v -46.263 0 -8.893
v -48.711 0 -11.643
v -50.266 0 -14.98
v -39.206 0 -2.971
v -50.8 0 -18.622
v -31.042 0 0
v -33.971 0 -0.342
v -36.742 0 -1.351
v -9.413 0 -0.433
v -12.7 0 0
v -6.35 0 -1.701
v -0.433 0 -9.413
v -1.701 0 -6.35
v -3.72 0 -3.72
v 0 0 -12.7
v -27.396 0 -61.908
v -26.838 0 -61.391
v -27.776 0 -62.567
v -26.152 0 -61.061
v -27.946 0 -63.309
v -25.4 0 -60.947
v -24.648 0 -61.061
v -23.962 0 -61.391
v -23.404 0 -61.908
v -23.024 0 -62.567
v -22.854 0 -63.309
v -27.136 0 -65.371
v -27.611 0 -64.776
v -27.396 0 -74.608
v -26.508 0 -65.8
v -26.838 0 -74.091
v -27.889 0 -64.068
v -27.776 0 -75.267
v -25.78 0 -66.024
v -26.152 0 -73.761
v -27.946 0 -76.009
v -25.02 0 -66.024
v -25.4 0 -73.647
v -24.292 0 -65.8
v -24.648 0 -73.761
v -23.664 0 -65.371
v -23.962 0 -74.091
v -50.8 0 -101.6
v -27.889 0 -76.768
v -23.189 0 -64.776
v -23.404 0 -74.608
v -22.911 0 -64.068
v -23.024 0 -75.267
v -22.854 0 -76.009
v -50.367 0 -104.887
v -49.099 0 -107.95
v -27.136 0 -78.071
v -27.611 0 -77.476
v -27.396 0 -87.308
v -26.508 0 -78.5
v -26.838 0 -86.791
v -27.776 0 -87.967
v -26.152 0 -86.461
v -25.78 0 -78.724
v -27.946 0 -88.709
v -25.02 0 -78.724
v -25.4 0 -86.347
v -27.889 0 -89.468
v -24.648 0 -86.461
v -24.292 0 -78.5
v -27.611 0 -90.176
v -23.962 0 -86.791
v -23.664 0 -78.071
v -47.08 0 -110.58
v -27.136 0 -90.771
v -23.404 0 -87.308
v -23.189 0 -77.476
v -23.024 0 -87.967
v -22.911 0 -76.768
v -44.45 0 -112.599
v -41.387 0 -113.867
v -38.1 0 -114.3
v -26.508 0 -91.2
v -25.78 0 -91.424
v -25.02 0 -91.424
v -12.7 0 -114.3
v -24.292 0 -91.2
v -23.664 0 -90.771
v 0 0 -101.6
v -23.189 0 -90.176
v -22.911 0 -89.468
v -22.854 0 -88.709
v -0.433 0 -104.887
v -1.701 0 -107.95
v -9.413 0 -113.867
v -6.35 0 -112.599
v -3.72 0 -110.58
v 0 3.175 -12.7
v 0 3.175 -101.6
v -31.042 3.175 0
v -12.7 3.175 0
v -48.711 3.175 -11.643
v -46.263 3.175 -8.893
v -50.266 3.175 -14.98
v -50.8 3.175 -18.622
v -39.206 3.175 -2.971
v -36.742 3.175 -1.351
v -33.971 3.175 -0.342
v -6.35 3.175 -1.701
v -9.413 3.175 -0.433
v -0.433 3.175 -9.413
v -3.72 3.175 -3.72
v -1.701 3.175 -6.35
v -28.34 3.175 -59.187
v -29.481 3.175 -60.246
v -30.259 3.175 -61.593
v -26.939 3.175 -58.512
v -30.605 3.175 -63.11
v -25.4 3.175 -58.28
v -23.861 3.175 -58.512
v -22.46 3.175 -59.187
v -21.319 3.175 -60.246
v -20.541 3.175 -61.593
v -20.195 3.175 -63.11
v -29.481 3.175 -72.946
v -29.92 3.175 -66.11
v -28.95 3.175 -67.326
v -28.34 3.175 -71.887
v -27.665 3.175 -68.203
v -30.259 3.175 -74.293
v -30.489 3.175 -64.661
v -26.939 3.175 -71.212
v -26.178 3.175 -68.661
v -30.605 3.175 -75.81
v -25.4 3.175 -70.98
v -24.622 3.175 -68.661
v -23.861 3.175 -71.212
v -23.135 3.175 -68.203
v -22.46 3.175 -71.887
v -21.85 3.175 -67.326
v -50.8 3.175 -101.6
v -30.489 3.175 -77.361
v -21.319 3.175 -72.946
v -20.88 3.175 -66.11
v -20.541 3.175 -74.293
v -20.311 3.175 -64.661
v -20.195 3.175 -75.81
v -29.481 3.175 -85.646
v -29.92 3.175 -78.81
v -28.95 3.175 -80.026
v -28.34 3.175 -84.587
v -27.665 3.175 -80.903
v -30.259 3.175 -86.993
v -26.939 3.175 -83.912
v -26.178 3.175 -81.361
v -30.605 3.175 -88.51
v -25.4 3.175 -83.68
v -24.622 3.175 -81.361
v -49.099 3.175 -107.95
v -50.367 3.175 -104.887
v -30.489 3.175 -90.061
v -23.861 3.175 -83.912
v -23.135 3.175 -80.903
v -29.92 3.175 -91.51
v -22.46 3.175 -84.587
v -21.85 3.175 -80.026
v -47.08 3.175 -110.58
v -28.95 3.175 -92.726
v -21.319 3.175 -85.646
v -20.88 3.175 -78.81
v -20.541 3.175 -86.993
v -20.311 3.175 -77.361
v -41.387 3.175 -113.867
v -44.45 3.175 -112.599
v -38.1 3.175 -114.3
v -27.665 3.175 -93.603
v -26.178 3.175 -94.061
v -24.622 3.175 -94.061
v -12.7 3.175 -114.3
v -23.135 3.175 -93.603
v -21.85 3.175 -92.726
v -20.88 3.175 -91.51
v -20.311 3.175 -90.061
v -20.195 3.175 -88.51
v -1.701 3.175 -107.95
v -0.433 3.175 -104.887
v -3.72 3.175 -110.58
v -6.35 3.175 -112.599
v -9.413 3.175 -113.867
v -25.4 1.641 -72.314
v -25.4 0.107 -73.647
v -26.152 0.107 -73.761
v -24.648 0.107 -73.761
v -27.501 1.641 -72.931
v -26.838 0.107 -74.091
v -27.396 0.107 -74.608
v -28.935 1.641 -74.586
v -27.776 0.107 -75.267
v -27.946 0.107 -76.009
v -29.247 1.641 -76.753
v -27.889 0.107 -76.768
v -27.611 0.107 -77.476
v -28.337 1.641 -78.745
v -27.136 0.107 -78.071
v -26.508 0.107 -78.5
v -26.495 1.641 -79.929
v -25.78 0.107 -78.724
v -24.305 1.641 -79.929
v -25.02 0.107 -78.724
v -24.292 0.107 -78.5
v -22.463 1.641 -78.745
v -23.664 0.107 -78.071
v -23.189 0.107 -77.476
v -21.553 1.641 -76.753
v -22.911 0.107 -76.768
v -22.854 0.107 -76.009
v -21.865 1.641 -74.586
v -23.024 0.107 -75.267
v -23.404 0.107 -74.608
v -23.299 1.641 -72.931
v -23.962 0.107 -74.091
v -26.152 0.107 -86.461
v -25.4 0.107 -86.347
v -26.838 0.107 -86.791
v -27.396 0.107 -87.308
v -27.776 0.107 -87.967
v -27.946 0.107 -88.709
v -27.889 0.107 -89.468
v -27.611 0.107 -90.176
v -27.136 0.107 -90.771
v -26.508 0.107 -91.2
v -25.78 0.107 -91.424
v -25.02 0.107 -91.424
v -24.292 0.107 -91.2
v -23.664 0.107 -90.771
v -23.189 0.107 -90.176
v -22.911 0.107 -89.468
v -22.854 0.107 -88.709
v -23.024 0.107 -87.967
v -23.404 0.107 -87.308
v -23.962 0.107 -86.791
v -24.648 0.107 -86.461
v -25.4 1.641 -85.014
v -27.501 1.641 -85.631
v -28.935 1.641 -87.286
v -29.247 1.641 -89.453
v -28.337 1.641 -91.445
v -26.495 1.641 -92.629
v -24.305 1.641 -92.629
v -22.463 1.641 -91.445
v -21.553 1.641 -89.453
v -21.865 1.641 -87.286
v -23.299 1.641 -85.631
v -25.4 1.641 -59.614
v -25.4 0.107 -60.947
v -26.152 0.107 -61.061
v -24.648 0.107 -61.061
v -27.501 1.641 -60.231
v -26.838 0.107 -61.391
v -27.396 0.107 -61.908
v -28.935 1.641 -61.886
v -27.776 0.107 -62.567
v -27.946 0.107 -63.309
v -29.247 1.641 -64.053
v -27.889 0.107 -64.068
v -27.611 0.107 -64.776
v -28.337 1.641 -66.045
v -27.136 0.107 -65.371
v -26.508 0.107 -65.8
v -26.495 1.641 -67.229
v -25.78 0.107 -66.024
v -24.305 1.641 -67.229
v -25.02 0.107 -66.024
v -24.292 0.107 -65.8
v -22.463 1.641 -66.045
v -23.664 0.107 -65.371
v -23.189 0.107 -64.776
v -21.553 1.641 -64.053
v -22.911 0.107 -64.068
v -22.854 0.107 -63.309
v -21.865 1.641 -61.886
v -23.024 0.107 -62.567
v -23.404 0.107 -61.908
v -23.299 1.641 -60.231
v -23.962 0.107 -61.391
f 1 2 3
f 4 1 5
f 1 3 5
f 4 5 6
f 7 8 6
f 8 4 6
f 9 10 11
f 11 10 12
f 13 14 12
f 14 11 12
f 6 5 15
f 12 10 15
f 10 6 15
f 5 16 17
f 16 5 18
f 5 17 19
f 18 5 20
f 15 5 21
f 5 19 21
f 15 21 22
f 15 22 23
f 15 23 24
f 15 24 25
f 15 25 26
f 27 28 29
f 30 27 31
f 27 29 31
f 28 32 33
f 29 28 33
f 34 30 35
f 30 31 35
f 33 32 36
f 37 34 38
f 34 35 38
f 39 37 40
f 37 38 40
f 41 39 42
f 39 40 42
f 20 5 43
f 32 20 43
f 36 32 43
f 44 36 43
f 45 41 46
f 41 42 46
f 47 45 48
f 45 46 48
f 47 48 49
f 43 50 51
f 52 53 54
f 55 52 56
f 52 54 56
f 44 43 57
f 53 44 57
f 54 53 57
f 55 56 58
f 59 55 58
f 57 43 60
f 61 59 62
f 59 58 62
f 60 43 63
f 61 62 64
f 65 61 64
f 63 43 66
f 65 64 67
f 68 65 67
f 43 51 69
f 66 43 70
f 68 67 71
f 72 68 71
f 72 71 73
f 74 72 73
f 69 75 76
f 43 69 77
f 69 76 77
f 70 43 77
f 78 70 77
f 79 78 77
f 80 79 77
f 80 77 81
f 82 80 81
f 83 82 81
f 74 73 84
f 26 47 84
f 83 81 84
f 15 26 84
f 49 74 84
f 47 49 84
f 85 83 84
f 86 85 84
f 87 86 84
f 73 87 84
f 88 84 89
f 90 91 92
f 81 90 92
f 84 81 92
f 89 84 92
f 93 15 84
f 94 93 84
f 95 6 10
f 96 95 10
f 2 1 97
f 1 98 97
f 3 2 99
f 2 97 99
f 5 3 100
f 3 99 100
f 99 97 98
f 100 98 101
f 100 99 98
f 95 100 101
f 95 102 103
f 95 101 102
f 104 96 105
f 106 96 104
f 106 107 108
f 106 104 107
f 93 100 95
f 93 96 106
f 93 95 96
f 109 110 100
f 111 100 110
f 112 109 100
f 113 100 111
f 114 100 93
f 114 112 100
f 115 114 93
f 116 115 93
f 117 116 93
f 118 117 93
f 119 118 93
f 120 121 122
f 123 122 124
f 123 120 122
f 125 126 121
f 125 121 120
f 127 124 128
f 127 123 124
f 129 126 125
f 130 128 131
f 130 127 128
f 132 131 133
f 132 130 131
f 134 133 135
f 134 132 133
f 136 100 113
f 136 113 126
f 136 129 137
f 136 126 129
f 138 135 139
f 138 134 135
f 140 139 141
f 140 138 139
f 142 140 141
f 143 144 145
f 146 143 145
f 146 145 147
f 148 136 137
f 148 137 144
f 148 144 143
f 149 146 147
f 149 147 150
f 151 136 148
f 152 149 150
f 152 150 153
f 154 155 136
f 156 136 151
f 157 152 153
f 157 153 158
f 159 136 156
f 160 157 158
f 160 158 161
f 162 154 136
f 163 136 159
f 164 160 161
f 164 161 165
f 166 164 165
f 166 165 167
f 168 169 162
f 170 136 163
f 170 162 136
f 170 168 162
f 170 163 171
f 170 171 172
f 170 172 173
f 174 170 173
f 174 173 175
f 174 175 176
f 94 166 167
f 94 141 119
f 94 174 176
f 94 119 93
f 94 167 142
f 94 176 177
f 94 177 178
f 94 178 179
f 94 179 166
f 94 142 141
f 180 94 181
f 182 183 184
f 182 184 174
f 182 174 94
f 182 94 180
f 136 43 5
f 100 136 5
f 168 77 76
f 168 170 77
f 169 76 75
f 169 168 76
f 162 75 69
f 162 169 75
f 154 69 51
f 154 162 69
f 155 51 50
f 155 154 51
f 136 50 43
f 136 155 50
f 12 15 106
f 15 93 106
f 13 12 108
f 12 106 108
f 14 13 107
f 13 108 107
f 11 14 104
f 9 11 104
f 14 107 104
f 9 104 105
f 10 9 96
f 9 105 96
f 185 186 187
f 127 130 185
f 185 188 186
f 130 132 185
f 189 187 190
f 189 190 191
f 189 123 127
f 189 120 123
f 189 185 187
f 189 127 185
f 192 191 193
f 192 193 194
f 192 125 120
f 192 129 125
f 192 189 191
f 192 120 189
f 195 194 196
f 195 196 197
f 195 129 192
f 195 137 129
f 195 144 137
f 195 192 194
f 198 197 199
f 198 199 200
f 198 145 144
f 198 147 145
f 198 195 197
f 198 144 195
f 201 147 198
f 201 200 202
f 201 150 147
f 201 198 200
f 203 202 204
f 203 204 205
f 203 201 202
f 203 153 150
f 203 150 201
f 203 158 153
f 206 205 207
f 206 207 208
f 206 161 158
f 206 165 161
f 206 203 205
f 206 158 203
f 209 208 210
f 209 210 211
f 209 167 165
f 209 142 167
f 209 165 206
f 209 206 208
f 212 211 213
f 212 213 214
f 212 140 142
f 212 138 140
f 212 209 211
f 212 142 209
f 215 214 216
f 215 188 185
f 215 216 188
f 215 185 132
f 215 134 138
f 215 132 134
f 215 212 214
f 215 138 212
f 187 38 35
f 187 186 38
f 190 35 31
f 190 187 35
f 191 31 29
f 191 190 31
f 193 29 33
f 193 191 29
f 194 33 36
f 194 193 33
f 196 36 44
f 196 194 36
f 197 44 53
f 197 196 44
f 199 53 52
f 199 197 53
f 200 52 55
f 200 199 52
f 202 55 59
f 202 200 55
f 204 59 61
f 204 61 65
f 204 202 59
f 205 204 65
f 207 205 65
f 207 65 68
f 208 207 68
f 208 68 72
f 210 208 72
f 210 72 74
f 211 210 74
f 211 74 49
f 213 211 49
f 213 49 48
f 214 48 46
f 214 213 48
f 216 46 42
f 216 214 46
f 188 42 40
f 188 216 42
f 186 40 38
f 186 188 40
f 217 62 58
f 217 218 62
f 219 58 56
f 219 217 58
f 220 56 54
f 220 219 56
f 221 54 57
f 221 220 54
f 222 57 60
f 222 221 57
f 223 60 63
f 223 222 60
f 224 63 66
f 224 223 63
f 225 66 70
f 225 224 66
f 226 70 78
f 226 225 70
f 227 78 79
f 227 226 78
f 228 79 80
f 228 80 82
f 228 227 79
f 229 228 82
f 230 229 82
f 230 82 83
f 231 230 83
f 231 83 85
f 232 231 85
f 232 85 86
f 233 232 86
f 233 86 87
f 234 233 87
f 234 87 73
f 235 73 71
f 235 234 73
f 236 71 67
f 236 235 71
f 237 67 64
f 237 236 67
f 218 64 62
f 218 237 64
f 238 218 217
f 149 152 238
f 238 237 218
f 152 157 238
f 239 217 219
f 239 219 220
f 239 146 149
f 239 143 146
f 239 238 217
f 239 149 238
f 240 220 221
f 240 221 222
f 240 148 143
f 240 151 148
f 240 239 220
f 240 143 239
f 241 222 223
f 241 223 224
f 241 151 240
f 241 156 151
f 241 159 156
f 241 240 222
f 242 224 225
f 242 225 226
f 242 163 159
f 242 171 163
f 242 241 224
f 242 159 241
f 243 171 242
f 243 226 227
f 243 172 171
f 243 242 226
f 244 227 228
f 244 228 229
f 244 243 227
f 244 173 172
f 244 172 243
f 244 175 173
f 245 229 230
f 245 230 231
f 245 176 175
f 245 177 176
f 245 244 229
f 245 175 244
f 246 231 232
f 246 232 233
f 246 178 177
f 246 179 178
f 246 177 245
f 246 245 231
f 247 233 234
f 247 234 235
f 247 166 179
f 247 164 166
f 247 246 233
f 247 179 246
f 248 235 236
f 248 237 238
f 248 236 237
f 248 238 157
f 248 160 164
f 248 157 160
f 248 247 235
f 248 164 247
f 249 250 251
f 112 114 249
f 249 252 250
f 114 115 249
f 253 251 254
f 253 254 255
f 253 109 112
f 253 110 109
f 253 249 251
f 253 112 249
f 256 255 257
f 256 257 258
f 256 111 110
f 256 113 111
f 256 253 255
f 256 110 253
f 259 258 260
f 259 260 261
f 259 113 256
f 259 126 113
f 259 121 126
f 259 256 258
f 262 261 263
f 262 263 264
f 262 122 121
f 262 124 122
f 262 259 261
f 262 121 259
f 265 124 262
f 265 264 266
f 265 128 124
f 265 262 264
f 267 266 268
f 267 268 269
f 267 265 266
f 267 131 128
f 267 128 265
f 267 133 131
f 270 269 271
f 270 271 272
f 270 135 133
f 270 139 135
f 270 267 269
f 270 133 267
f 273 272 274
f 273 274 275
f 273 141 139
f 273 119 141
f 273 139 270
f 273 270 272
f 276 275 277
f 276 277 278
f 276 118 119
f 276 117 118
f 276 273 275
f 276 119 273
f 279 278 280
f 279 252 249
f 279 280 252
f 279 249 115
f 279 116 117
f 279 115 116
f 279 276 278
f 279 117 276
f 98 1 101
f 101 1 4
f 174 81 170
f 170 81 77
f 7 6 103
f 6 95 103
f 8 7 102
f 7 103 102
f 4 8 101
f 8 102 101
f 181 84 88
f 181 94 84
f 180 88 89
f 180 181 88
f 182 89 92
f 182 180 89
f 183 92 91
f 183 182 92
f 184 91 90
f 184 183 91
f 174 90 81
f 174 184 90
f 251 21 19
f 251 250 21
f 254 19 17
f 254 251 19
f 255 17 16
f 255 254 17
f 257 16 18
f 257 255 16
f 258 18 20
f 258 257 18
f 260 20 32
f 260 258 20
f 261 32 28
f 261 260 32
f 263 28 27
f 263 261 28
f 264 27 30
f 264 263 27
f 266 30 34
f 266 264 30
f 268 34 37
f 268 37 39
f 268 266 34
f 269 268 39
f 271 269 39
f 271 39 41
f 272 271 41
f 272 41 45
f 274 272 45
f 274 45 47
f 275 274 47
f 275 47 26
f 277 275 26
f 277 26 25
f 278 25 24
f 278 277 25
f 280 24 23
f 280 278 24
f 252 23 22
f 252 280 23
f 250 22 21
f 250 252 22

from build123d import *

# Parameters (mm, degrees)
BOSS_EXTRUDE1_DEPTH                         = 3.175
CSK_FOR_10_FLAT_HEAD_SOCKET_CAP_SCR_2_COUNT = 2
CSK_FOR_10_FLAT_HEAD_SOCKET_CAP_SCR_2_PITCH = 12.7
CSK_FOR_10_FLAT_HEAD_SOCKET_CAP_SCR_3_COUNT = 2
CSK_FOR_10_FLAT_HEAD_SOCKET_CAP_SCR_3_PITCH = 12.7
FILLET2_R                                   = 12.7


with BuildPart() as part:
    # Sketch1 → Boss-Extrude1 (new body)
    with BuildSketch(Plane(origin=(0, 0, 0), x_dir=(1, 0, 0), z_dir=(0, 1, 0))):
        Polygon((0, 0), (0, 114.3), (-50.8, 114.3), (-50.8, 12.7), (-35.664729374, 0), align=None)
    extrude(amount=BOSS_EXTRUDE1_DEPTH)

    # Sketch6 → CSK for #10 Flat Head Socket Cap Screw1 (revolve, cut)
    with BuildSketch(Plane(origin=(-25.4, 3.175, -76.2), x_dir=(0, 0, 1), z_dir=(1, 0, 0))):
        Polygon((0, 0), (0, 3.175), (2.5527, 3.175), (2.5527, 3.068032542), (5.2197, 0), align=None)
    csk_for_10_flat_head_socket_cap_screw1 = revolve(axis=Axis((-25.4, 9.525, -76.2), (0, -1, 0)), mode=Mode.SUBTRACT)

    # CSK for _10 Flat Head Socket Cap Scr 2: CSK for #10 Flat Head Socket Cap Screw1 ×2
    with Locations(*[(0, 0, i * CSK_FOR_10_FLAT_HEAD_SOCKET_CAP_SCR_2_PITCH) for i in range(1, CSK_FOR_10_FLAT_HEAD_SOCKET_CAP_SCR_2_COUNT)]):
        add(csk_for_10_flat_head_socket_cap_screw1, mode=Mode.SUBTRACT)

    # CSK for _10 Flat Head Socket Cap Scr 3: CSK for #10 Flat Head Socket Cap Screw1 ×2
    with Locations(*[(0, 0, -i * CSK_FOR_10_FLAT_HEAD_SOCKET_CAP_SCR_3_PITCH) for i in range(1, CSK_FOR_10_FLAT_HEAD_SOCKET_CAP_SCR_3_COUNT)]):
        add(csk_for_10_flat_head_socket_cap_screw1, mode=Mode.SUBTRACT)

    # Fillet2
    fillet2_edges = [part.edges().sort_by_distance(p)[0] for p in [
        (-35.664729374, 1.5875, 0),
        (-50.8, 1.5875, -12.7),
        (-50.8, 1.5875, -114.3),
        (0, 1.5875, -114.3),
        (0, 1.5875, 0),
    ]]
    fillet(fillet2_edges, radius=FILLET2_R)


solid = part.part
